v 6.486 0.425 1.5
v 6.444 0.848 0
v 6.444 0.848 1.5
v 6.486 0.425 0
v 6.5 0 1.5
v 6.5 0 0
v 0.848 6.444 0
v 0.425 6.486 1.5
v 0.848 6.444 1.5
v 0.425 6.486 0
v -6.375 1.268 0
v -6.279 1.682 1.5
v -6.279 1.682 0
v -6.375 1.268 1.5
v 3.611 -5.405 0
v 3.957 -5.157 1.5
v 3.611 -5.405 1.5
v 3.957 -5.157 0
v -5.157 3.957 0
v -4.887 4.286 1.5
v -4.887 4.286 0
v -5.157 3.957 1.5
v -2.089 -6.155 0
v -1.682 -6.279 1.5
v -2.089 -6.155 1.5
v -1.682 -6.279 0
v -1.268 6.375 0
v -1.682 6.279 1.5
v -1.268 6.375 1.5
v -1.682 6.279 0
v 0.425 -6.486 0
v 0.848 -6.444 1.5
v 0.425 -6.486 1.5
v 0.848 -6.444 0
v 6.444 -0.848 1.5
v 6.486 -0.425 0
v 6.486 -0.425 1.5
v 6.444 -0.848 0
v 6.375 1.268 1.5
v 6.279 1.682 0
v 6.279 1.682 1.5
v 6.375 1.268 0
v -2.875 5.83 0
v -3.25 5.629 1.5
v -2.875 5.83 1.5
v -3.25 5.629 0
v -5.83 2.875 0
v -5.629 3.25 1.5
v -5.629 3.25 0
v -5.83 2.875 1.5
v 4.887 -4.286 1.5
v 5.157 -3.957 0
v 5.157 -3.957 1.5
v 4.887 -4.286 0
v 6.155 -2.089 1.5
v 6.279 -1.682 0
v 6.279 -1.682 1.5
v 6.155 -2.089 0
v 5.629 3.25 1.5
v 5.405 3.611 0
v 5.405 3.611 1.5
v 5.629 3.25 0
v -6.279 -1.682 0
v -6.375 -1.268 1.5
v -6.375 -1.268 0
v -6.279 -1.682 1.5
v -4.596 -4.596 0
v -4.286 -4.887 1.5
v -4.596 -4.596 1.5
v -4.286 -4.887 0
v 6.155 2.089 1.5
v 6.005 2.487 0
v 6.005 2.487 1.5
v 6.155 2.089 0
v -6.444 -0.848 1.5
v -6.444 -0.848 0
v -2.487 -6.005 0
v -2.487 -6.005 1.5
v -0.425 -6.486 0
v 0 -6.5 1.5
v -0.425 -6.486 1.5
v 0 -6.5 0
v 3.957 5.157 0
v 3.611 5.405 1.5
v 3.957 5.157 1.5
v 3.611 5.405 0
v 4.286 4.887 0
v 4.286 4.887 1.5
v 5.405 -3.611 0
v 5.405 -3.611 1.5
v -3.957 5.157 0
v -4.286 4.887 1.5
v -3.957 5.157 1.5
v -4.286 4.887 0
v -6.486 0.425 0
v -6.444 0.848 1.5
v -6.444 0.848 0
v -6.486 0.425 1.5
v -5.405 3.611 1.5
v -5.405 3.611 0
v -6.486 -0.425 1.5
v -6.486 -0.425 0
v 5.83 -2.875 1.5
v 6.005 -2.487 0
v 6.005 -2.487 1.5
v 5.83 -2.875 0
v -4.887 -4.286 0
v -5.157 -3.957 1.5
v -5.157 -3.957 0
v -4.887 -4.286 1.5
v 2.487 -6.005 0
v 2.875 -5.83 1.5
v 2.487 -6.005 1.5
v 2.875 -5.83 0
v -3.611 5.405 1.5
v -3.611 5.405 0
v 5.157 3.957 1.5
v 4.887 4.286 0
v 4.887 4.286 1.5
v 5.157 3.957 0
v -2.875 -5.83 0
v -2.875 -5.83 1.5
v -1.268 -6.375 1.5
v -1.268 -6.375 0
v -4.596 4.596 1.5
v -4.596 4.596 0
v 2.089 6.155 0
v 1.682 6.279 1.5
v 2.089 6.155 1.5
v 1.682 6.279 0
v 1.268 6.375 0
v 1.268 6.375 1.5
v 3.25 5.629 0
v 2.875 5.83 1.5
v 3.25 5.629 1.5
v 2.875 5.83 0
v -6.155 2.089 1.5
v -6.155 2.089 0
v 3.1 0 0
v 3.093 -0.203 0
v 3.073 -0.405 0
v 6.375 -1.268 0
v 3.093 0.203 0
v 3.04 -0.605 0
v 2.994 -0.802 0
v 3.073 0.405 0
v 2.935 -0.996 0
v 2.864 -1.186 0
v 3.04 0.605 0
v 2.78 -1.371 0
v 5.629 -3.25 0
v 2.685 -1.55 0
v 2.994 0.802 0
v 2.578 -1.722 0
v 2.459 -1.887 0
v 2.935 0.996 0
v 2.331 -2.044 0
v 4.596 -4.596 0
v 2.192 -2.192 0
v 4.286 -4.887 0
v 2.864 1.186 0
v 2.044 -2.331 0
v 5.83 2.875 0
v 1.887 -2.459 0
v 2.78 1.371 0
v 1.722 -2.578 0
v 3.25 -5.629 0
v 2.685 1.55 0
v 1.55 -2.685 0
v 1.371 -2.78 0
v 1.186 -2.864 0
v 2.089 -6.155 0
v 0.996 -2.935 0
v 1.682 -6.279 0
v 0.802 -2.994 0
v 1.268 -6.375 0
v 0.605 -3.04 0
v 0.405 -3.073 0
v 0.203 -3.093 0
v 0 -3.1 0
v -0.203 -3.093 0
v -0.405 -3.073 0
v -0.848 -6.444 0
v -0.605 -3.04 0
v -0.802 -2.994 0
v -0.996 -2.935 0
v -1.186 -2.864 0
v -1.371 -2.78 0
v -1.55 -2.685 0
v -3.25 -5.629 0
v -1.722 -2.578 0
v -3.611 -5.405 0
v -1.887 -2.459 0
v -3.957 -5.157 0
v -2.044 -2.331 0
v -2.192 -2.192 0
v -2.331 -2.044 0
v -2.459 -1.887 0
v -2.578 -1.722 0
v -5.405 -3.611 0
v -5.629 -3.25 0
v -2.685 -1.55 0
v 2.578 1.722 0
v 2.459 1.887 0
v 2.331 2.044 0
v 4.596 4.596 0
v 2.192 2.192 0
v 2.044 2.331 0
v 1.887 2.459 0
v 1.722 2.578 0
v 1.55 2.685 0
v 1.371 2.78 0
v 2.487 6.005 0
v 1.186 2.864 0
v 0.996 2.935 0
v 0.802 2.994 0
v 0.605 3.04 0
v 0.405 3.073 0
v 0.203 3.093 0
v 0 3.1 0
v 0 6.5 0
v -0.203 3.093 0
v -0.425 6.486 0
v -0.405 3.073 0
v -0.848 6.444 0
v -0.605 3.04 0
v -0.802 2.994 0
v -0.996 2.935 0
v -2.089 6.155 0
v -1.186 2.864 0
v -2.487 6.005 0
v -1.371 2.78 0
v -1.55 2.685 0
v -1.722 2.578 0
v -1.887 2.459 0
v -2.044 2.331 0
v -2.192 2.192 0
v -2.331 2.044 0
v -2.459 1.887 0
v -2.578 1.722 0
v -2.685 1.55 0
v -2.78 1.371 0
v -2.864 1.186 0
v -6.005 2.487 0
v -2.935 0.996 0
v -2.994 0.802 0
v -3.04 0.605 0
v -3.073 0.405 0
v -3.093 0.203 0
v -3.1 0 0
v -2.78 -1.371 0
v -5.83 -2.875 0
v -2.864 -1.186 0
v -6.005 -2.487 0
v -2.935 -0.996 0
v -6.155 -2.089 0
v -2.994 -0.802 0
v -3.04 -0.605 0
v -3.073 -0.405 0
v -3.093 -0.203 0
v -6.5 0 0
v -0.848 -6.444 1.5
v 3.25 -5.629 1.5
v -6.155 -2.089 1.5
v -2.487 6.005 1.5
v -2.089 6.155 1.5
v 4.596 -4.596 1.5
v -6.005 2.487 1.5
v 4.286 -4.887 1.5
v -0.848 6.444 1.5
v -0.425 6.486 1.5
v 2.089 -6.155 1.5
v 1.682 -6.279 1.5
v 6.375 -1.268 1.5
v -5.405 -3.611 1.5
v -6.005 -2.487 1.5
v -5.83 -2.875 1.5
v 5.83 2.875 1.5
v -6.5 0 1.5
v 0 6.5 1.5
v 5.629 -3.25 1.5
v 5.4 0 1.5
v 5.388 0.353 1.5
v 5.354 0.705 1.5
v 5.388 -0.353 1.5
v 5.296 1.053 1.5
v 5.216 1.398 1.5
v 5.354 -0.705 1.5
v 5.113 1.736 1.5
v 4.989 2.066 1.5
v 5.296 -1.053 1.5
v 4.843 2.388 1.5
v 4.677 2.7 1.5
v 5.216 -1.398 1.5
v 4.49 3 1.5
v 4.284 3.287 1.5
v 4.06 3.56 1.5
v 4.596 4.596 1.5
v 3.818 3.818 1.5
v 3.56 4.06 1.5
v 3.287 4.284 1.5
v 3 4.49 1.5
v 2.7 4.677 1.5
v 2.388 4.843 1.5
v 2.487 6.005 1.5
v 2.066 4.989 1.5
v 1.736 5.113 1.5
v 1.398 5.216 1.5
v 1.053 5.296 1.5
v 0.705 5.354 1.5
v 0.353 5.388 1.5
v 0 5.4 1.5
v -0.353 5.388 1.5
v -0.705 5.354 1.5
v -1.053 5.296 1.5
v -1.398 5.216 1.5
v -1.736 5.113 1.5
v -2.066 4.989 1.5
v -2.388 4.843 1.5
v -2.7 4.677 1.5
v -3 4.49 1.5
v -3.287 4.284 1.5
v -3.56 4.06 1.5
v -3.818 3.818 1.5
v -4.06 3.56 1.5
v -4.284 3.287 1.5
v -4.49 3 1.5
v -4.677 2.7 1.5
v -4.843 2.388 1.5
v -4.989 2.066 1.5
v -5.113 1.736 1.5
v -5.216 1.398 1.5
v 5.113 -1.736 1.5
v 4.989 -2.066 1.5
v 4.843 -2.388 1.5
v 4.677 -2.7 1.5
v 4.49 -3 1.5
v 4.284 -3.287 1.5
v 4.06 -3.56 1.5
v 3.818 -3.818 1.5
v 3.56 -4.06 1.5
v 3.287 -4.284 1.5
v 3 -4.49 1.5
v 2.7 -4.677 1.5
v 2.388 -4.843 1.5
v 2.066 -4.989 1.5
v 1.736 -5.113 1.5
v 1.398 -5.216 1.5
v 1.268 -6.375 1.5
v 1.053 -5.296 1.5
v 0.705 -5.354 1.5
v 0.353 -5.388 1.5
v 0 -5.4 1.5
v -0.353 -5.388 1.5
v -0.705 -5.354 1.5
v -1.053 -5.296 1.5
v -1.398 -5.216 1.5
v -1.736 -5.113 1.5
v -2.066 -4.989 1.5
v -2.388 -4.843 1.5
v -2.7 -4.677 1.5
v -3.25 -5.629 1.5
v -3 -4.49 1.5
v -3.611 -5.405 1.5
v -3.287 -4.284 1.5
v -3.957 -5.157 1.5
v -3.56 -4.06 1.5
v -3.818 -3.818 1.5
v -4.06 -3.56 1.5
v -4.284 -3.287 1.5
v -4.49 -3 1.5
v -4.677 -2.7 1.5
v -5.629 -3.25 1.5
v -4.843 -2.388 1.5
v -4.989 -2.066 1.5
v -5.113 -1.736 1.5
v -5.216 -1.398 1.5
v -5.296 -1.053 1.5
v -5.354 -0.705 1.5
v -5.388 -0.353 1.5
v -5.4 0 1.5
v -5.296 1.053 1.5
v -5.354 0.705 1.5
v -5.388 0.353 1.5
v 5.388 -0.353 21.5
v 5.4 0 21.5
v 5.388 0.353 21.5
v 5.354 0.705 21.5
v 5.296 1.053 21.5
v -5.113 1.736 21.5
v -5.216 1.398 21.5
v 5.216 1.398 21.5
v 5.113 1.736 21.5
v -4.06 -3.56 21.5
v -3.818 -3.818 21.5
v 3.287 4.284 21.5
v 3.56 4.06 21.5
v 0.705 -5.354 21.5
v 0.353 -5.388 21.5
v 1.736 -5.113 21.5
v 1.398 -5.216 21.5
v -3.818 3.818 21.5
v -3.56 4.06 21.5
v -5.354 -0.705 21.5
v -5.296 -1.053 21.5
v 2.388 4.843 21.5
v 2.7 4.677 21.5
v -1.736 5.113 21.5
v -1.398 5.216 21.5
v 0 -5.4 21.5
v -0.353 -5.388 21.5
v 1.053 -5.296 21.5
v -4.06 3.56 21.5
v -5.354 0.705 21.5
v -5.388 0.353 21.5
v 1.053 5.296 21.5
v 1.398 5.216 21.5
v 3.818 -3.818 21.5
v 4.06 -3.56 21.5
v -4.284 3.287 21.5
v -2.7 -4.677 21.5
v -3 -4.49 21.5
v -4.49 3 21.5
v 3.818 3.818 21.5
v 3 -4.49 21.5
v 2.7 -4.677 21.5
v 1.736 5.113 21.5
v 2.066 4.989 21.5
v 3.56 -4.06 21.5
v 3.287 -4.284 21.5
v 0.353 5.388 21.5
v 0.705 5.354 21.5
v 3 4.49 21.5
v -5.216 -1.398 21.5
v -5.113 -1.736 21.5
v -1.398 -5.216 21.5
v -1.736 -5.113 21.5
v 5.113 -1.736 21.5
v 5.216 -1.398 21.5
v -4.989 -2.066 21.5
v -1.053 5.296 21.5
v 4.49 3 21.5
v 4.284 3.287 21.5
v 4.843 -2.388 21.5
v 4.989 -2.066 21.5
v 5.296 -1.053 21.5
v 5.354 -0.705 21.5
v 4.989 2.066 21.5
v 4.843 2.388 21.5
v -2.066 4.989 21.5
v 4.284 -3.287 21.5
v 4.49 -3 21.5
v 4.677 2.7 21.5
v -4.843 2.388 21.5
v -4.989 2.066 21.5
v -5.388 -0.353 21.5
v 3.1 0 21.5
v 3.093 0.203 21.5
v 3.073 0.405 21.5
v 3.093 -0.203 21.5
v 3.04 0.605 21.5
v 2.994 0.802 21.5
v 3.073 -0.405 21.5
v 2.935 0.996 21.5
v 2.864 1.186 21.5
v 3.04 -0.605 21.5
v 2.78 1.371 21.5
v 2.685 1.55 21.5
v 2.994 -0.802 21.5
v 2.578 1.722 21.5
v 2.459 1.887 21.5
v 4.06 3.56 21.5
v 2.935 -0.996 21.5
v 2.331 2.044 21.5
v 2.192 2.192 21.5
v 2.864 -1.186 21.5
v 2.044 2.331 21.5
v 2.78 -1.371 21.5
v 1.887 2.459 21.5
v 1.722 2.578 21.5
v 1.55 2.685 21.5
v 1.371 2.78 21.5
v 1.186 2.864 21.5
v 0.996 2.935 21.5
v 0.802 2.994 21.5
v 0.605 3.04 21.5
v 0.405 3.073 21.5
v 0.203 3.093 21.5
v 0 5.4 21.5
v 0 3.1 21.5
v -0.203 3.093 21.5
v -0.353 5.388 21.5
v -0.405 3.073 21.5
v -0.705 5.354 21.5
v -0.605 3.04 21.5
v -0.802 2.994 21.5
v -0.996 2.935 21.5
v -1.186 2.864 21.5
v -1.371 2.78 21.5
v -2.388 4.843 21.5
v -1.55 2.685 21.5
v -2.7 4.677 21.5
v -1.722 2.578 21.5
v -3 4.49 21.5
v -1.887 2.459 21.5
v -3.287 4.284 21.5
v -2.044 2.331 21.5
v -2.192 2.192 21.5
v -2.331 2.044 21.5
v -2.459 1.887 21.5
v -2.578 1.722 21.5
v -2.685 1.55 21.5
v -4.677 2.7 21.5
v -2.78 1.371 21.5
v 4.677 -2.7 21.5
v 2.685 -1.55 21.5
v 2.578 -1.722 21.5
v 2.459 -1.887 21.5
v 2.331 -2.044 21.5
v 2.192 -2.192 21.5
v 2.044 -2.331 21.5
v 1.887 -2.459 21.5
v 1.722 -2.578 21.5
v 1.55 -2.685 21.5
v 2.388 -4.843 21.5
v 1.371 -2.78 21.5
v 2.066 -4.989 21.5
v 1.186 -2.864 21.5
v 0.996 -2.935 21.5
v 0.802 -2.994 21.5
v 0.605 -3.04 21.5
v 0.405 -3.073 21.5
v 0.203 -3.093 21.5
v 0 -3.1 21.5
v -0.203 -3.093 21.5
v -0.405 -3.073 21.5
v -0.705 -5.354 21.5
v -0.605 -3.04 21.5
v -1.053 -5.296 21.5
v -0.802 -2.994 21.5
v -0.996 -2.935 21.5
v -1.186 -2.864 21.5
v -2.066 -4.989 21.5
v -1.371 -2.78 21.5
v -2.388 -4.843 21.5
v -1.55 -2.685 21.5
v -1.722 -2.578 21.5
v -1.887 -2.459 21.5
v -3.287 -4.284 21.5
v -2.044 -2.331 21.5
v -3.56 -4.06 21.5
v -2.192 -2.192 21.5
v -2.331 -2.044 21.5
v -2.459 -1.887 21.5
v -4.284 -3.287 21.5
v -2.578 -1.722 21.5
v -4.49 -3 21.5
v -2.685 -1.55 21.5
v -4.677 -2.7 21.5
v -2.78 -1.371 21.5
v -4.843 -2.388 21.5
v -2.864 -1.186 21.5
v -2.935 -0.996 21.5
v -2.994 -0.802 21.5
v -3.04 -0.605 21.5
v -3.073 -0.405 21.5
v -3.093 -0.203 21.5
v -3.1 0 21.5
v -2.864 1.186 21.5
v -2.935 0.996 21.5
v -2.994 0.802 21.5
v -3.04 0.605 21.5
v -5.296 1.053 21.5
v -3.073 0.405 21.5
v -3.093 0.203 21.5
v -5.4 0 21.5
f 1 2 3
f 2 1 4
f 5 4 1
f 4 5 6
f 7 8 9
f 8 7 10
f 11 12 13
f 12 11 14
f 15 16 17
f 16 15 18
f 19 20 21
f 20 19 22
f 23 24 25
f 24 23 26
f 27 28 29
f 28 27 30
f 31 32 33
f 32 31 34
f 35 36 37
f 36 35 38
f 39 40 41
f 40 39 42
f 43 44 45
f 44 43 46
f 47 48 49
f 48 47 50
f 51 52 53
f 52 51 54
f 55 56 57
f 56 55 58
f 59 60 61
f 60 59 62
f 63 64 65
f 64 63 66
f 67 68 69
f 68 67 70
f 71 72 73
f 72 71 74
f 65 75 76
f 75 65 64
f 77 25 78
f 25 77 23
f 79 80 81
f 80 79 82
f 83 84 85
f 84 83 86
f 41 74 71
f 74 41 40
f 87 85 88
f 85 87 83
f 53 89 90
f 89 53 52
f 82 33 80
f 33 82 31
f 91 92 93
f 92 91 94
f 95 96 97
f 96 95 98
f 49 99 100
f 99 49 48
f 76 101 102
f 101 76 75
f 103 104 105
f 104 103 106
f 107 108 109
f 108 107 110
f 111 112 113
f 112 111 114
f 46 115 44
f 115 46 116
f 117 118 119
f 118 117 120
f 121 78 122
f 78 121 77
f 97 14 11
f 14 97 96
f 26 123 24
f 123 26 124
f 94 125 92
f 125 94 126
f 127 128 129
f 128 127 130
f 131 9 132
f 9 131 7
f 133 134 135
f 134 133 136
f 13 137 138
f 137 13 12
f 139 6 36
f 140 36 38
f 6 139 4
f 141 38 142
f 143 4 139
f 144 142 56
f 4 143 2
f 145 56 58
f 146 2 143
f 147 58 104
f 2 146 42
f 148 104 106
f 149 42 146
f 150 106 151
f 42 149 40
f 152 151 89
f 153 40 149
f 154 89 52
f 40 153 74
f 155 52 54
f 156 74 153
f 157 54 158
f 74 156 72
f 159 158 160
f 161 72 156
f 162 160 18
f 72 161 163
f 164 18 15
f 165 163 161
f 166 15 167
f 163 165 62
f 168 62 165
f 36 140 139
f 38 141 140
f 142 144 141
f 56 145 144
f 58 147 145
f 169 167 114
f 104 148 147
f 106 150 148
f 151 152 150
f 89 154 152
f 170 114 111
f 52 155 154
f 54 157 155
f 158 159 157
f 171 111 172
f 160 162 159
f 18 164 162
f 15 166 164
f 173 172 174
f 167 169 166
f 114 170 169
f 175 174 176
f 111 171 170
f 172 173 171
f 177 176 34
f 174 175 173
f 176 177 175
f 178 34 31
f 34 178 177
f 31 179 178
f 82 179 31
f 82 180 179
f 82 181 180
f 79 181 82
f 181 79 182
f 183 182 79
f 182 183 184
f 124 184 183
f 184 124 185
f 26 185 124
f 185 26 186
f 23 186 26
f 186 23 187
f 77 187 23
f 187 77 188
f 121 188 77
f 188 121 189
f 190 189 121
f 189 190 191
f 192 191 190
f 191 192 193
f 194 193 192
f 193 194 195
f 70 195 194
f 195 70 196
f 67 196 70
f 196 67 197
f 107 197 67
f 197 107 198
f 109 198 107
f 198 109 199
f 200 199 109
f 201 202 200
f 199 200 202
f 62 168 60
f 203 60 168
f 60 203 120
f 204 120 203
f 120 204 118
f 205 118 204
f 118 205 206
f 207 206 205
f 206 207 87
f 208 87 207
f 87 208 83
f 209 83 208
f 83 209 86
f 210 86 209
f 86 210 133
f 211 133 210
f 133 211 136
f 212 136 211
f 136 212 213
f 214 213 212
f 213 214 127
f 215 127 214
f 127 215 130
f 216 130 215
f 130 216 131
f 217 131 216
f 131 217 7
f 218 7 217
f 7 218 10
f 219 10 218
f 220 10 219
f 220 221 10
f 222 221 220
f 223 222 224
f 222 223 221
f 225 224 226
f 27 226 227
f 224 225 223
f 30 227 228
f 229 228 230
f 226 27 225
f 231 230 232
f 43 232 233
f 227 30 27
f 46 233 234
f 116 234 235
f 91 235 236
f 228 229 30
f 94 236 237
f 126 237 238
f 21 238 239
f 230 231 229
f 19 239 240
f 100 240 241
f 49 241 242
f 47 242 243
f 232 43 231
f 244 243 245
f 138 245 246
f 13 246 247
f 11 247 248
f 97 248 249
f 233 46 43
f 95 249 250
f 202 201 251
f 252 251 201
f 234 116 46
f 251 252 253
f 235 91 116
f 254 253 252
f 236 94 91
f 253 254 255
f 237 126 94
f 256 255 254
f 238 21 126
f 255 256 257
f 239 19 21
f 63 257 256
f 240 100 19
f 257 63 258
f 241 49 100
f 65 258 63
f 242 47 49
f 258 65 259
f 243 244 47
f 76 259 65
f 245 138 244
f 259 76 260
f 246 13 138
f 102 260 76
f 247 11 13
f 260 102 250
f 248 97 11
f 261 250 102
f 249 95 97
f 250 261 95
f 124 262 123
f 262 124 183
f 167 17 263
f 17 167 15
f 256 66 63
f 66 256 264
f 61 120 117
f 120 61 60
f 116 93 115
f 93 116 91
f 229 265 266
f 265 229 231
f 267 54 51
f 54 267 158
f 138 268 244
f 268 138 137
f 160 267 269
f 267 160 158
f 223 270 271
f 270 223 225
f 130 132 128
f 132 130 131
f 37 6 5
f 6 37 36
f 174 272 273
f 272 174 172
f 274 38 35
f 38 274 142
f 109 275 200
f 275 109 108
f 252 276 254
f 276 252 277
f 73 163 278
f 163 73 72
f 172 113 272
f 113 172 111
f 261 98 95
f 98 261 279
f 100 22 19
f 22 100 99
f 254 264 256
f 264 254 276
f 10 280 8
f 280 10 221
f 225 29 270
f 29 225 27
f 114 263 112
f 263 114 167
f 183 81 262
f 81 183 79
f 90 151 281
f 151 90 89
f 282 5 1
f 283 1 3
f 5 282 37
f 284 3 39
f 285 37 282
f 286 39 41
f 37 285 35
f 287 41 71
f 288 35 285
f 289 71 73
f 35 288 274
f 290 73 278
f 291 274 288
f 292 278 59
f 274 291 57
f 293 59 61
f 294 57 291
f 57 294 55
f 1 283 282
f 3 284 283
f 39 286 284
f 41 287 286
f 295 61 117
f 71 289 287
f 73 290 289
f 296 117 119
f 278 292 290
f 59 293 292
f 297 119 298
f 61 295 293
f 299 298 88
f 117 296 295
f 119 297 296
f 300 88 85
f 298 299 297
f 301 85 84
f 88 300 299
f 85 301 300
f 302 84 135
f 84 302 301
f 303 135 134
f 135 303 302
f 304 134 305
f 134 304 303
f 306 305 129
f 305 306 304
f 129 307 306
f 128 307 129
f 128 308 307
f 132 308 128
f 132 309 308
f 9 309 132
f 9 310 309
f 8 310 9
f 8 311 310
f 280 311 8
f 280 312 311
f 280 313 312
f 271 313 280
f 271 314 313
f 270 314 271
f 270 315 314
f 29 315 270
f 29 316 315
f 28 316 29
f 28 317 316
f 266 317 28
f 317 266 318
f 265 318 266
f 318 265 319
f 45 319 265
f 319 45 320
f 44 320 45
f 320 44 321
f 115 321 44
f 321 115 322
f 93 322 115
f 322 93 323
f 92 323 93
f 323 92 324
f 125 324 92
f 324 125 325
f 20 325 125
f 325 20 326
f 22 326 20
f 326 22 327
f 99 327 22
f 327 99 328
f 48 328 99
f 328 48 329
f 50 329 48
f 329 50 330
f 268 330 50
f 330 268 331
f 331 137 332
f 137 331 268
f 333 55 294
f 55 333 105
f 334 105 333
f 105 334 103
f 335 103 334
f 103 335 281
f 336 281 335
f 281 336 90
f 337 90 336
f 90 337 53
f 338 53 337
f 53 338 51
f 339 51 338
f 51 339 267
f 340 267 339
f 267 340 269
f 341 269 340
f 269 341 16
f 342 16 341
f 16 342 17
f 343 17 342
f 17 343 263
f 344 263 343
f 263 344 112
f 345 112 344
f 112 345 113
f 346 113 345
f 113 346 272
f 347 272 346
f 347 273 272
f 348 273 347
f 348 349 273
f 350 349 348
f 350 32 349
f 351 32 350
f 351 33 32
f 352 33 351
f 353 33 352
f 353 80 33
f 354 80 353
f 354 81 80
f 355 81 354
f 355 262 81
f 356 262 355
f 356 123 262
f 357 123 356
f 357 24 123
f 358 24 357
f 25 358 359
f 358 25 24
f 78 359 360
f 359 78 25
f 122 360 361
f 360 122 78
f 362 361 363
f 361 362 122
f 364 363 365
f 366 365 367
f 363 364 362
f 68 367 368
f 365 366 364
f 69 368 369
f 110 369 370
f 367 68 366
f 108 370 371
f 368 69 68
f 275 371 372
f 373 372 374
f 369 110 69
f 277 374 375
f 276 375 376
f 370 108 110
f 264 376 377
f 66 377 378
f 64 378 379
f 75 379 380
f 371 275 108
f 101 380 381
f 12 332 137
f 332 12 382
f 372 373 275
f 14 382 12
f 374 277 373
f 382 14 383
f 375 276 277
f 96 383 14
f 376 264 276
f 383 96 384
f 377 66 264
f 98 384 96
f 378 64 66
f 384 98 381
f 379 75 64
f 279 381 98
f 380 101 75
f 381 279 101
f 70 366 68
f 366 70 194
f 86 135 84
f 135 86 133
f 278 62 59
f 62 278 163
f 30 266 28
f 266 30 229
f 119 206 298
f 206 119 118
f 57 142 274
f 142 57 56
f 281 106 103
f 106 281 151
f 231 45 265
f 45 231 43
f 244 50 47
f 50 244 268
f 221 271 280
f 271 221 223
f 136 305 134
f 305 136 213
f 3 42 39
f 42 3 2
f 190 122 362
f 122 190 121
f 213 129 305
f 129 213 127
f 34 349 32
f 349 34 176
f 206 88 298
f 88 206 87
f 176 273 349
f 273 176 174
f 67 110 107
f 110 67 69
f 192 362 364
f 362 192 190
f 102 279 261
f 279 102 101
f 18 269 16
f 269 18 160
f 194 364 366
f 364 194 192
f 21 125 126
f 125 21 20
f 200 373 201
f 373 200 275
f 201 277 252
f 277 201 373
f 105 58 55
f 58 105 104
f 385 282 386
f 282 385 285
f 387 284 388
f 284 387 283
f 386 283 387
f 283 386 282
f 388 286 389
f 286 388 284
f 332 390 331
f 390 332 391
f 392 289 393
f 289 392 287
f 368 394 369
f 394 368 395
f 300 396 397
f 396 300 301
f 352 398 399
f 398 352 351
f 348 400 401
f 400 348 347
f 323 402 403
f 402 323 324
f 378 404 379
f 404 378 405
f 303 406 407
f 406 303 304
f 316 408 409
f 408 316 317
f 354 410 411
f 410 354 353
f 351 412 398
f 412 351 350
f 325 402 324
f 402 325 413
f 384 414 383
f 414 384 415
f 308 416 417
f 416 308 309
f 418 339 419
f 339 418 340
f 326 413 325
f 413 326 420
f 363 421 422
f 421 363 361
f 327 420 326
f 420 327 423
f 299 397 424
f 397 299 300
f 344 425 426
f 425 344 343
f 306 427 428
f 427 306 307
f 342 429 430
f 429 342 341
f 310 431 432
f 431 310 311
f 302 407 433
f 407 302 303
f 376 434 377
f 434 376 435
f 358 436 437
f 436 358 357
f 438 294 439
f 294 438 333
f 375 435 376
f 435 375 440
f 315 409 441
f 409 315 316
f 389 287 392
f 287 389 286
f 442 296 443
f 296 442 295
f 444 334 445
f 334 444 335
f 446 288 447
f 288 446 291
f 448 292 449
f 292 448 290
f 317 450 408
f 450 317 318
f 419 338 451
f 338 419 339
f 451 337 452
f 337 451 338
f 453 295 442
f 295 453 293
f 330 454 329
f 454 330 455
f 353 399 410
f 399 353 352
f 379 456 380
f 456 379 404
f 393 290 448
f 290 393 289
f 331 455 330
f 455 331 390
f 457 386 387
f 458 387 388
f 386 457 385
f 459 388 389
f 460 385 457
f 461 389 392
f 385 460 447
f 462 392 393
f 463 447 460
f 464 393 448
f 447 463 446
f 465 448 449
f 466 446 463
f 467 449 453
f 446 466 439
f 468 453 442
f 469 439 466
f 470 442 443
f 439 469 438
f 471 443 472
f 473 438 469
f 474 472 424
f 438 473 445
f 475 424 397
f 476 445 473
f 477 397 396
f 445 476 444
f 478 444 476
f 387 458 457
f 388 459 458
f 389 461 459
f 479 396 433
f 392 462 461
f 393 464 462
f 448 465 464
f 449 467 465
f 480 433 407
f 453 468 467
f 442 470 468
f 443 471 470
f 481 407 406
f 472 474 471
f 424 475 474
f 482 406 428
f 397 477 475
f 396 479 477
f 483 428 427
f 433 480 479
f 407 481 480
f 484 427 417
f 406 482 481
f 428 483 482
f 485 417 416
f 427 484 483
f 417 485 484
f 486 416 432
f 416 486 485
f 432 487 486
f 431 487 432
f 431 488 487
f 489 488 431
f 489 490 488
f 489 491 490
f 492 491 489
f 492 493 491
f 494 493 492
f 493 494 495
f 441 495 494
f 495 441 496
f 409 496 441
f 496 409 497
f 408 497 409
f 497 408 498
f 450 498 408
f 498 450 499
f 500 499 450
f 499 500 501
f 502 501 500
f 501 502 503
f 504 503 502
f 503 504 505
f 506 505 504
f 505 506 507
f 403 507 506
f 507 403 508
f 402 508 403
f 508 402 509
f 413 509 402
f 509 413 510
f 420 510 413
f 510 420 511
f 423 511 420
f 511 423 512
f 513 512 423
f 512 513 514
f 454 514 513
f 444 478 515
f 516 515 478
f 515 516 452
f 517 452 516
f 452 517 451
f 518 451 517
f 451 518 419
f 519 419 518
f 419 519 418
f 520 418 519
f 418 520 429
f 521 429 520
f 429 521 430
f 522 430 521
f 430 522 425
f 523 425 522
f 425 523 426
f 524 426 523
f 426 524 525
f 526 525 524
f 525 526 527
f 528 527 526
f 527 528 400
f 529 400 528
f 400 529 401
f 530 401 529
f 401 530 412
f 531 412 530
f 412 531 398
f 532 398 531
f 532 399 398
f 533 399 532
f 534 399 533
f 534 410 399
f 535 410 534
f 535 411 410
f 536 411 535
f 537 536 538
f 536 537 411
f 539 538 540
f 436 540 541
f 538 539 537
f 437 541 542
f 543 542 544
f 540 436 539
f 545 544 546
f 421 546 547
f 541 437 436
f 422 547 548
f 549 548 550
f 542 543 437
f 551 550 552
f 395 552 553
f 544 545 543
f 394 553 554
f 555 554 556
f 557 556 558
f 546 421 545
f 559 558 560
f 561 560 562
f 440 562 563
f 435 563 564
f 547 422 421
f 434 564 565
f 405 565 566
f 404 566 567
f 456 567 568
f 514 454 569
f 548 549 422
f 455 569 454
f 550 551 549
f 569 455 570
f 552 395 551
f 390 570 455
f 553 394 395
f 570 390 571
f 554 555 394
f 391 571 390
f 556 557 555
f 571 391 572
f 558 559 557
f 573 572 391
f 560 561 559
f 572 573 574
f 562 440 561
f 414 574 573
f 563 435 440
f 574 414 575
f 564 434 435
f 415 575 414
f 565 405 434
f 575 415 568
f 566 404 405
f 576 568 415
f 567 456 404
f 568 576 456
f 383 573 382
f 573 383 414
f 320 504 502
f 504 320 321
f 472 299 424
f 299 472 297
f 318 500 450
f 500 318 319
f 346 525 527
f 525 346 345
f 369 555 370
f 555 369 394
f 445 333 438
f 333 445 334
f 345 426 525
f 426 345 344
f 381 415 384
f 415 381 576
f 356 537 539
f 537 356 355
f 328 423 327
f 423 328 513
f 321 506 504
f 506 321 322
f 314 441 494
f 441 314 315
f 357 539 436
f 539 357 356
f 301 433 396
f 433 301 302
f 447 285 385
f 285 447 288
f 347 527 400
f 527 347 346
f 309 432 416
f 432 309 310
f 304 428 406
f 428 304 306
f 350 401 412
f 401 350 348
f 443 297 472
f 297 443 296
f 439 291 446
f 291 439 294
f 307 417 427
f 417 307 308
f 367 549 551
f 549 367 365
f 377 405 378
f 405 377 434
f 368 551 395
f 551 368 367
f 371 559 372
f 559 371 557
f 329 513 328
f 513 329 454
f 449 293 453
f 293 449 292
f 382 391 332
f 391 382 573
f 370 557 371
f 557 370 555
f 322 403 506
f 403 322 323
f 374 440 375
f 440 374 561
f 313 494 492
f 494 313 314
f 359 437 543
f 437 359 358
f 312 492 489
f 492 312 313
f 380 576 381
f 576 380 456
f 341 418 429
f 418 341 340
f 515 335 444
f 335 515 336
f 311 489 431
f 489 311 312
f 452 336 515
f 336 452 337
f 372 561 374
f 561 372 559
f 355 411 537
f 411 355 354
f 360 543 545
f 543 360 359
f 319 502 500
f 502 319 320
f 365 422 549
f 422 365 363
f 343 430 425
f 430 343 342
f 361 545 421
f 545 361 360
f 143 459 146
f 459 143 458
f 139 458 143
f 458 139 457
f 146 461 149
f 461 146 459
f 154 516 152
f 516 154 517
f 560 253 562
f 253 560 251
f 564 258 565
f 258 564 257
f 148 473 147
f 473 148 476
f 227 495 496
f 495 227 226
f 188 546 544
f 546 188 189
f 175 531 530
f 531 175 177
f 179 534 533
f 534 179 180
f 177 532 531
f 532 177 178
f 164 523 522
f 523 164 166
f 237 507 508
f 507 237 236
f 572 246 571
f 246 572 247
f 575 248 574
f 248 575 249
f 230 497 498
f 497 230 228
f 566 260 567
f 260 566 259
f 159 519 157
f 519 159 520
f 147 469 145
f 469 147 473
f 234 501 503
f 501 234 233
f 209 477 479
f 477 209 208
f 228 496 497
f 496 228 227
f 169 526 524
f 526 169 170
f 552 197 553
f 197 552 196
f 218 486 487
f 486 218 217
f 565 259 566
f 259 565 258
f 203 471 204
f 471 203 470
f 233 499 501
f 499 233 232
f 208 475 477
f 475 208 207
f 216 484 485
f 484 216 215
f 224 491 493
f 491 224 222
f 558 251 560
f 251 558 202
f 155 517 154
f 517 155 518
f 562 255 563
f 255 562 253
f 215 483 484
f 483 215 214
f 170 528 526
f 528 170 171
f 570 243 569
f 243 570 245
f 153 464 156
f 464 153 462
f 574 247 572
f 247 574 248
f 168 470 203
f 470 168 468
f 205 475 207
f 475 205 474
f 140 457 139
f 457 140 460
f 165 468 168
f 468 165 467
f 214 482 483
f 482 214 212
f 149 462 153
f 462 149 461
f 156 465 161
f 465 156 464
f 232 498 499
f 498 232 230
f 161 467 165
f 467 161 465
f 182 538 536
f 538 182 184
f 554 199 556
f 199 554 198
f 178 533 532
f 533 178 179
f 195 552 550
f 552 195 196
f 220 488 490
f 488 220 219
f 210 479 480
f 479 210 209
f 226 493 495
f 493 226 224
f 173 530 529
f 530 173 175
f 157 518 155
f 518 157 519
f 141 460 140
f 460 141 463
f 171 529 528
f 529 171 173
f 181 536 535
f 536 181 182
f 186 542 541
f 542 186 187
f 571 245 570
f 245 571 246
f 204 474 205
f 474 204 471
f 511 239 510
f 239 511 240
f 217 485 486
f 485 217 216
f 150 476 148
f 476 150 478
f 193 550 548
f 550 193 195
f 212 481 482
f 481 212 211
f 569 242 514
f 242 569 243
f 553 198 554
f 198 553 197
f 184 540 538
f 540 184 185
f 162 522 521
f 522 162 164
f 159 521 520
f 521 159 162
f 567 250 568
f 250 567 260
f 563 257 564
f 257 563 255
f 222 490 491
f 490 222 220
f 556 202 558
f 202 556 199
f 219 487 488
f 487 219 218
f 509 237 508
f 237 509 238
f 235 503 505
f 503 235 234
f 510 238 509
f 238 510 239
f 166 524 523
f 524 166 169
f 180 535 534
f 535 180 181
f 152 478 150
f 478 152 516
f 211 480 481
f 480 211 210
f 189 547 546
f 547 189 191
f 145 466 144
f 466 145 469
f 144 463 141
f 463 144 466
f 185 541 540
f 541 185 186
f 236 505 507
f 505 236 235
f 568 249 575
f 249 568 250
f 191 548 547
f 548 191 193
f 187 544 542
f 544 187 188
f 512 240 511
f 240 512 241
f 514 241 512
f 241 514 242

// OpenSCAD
// Adapter sleeve: 0.2 mL PCR tube in a 1.5 mL tube rack hole
// Printed upside down: collar on the bed, sleeve body rising upward.

$fn = 96;

// --- Dimensions (mm) ---
collar_d      = 13.0;   // collar outer diameter
collar_h      = 1.5;    // collar thickness (z = 0 to 1.5)
body_d        = 10.8;   // sleeve body outer diameter
total_h       = 21.5;   // overall height (top of sleeve body)
bore_d        = 6.2;    // straight through-bore diameter
eps           = 0.5;    // cutter overshoot past faces

difference() {
    union() {
        // Collar lying on the print bed
        cylinder(d = collar_d, h = collar_h);
        // Sleeve body rising from the collar (overlaps slightly into collar)
        translate([0, 0, collar_h - 0.01])
            cylinder(d = body_d, h = total_h - collar_h + 0.01);
    }
    // Through-bore, open at both ends
    translate([0, 0, -eps])
        cylinder(d = bore_d, h = total_h + 2 * eps);
}
